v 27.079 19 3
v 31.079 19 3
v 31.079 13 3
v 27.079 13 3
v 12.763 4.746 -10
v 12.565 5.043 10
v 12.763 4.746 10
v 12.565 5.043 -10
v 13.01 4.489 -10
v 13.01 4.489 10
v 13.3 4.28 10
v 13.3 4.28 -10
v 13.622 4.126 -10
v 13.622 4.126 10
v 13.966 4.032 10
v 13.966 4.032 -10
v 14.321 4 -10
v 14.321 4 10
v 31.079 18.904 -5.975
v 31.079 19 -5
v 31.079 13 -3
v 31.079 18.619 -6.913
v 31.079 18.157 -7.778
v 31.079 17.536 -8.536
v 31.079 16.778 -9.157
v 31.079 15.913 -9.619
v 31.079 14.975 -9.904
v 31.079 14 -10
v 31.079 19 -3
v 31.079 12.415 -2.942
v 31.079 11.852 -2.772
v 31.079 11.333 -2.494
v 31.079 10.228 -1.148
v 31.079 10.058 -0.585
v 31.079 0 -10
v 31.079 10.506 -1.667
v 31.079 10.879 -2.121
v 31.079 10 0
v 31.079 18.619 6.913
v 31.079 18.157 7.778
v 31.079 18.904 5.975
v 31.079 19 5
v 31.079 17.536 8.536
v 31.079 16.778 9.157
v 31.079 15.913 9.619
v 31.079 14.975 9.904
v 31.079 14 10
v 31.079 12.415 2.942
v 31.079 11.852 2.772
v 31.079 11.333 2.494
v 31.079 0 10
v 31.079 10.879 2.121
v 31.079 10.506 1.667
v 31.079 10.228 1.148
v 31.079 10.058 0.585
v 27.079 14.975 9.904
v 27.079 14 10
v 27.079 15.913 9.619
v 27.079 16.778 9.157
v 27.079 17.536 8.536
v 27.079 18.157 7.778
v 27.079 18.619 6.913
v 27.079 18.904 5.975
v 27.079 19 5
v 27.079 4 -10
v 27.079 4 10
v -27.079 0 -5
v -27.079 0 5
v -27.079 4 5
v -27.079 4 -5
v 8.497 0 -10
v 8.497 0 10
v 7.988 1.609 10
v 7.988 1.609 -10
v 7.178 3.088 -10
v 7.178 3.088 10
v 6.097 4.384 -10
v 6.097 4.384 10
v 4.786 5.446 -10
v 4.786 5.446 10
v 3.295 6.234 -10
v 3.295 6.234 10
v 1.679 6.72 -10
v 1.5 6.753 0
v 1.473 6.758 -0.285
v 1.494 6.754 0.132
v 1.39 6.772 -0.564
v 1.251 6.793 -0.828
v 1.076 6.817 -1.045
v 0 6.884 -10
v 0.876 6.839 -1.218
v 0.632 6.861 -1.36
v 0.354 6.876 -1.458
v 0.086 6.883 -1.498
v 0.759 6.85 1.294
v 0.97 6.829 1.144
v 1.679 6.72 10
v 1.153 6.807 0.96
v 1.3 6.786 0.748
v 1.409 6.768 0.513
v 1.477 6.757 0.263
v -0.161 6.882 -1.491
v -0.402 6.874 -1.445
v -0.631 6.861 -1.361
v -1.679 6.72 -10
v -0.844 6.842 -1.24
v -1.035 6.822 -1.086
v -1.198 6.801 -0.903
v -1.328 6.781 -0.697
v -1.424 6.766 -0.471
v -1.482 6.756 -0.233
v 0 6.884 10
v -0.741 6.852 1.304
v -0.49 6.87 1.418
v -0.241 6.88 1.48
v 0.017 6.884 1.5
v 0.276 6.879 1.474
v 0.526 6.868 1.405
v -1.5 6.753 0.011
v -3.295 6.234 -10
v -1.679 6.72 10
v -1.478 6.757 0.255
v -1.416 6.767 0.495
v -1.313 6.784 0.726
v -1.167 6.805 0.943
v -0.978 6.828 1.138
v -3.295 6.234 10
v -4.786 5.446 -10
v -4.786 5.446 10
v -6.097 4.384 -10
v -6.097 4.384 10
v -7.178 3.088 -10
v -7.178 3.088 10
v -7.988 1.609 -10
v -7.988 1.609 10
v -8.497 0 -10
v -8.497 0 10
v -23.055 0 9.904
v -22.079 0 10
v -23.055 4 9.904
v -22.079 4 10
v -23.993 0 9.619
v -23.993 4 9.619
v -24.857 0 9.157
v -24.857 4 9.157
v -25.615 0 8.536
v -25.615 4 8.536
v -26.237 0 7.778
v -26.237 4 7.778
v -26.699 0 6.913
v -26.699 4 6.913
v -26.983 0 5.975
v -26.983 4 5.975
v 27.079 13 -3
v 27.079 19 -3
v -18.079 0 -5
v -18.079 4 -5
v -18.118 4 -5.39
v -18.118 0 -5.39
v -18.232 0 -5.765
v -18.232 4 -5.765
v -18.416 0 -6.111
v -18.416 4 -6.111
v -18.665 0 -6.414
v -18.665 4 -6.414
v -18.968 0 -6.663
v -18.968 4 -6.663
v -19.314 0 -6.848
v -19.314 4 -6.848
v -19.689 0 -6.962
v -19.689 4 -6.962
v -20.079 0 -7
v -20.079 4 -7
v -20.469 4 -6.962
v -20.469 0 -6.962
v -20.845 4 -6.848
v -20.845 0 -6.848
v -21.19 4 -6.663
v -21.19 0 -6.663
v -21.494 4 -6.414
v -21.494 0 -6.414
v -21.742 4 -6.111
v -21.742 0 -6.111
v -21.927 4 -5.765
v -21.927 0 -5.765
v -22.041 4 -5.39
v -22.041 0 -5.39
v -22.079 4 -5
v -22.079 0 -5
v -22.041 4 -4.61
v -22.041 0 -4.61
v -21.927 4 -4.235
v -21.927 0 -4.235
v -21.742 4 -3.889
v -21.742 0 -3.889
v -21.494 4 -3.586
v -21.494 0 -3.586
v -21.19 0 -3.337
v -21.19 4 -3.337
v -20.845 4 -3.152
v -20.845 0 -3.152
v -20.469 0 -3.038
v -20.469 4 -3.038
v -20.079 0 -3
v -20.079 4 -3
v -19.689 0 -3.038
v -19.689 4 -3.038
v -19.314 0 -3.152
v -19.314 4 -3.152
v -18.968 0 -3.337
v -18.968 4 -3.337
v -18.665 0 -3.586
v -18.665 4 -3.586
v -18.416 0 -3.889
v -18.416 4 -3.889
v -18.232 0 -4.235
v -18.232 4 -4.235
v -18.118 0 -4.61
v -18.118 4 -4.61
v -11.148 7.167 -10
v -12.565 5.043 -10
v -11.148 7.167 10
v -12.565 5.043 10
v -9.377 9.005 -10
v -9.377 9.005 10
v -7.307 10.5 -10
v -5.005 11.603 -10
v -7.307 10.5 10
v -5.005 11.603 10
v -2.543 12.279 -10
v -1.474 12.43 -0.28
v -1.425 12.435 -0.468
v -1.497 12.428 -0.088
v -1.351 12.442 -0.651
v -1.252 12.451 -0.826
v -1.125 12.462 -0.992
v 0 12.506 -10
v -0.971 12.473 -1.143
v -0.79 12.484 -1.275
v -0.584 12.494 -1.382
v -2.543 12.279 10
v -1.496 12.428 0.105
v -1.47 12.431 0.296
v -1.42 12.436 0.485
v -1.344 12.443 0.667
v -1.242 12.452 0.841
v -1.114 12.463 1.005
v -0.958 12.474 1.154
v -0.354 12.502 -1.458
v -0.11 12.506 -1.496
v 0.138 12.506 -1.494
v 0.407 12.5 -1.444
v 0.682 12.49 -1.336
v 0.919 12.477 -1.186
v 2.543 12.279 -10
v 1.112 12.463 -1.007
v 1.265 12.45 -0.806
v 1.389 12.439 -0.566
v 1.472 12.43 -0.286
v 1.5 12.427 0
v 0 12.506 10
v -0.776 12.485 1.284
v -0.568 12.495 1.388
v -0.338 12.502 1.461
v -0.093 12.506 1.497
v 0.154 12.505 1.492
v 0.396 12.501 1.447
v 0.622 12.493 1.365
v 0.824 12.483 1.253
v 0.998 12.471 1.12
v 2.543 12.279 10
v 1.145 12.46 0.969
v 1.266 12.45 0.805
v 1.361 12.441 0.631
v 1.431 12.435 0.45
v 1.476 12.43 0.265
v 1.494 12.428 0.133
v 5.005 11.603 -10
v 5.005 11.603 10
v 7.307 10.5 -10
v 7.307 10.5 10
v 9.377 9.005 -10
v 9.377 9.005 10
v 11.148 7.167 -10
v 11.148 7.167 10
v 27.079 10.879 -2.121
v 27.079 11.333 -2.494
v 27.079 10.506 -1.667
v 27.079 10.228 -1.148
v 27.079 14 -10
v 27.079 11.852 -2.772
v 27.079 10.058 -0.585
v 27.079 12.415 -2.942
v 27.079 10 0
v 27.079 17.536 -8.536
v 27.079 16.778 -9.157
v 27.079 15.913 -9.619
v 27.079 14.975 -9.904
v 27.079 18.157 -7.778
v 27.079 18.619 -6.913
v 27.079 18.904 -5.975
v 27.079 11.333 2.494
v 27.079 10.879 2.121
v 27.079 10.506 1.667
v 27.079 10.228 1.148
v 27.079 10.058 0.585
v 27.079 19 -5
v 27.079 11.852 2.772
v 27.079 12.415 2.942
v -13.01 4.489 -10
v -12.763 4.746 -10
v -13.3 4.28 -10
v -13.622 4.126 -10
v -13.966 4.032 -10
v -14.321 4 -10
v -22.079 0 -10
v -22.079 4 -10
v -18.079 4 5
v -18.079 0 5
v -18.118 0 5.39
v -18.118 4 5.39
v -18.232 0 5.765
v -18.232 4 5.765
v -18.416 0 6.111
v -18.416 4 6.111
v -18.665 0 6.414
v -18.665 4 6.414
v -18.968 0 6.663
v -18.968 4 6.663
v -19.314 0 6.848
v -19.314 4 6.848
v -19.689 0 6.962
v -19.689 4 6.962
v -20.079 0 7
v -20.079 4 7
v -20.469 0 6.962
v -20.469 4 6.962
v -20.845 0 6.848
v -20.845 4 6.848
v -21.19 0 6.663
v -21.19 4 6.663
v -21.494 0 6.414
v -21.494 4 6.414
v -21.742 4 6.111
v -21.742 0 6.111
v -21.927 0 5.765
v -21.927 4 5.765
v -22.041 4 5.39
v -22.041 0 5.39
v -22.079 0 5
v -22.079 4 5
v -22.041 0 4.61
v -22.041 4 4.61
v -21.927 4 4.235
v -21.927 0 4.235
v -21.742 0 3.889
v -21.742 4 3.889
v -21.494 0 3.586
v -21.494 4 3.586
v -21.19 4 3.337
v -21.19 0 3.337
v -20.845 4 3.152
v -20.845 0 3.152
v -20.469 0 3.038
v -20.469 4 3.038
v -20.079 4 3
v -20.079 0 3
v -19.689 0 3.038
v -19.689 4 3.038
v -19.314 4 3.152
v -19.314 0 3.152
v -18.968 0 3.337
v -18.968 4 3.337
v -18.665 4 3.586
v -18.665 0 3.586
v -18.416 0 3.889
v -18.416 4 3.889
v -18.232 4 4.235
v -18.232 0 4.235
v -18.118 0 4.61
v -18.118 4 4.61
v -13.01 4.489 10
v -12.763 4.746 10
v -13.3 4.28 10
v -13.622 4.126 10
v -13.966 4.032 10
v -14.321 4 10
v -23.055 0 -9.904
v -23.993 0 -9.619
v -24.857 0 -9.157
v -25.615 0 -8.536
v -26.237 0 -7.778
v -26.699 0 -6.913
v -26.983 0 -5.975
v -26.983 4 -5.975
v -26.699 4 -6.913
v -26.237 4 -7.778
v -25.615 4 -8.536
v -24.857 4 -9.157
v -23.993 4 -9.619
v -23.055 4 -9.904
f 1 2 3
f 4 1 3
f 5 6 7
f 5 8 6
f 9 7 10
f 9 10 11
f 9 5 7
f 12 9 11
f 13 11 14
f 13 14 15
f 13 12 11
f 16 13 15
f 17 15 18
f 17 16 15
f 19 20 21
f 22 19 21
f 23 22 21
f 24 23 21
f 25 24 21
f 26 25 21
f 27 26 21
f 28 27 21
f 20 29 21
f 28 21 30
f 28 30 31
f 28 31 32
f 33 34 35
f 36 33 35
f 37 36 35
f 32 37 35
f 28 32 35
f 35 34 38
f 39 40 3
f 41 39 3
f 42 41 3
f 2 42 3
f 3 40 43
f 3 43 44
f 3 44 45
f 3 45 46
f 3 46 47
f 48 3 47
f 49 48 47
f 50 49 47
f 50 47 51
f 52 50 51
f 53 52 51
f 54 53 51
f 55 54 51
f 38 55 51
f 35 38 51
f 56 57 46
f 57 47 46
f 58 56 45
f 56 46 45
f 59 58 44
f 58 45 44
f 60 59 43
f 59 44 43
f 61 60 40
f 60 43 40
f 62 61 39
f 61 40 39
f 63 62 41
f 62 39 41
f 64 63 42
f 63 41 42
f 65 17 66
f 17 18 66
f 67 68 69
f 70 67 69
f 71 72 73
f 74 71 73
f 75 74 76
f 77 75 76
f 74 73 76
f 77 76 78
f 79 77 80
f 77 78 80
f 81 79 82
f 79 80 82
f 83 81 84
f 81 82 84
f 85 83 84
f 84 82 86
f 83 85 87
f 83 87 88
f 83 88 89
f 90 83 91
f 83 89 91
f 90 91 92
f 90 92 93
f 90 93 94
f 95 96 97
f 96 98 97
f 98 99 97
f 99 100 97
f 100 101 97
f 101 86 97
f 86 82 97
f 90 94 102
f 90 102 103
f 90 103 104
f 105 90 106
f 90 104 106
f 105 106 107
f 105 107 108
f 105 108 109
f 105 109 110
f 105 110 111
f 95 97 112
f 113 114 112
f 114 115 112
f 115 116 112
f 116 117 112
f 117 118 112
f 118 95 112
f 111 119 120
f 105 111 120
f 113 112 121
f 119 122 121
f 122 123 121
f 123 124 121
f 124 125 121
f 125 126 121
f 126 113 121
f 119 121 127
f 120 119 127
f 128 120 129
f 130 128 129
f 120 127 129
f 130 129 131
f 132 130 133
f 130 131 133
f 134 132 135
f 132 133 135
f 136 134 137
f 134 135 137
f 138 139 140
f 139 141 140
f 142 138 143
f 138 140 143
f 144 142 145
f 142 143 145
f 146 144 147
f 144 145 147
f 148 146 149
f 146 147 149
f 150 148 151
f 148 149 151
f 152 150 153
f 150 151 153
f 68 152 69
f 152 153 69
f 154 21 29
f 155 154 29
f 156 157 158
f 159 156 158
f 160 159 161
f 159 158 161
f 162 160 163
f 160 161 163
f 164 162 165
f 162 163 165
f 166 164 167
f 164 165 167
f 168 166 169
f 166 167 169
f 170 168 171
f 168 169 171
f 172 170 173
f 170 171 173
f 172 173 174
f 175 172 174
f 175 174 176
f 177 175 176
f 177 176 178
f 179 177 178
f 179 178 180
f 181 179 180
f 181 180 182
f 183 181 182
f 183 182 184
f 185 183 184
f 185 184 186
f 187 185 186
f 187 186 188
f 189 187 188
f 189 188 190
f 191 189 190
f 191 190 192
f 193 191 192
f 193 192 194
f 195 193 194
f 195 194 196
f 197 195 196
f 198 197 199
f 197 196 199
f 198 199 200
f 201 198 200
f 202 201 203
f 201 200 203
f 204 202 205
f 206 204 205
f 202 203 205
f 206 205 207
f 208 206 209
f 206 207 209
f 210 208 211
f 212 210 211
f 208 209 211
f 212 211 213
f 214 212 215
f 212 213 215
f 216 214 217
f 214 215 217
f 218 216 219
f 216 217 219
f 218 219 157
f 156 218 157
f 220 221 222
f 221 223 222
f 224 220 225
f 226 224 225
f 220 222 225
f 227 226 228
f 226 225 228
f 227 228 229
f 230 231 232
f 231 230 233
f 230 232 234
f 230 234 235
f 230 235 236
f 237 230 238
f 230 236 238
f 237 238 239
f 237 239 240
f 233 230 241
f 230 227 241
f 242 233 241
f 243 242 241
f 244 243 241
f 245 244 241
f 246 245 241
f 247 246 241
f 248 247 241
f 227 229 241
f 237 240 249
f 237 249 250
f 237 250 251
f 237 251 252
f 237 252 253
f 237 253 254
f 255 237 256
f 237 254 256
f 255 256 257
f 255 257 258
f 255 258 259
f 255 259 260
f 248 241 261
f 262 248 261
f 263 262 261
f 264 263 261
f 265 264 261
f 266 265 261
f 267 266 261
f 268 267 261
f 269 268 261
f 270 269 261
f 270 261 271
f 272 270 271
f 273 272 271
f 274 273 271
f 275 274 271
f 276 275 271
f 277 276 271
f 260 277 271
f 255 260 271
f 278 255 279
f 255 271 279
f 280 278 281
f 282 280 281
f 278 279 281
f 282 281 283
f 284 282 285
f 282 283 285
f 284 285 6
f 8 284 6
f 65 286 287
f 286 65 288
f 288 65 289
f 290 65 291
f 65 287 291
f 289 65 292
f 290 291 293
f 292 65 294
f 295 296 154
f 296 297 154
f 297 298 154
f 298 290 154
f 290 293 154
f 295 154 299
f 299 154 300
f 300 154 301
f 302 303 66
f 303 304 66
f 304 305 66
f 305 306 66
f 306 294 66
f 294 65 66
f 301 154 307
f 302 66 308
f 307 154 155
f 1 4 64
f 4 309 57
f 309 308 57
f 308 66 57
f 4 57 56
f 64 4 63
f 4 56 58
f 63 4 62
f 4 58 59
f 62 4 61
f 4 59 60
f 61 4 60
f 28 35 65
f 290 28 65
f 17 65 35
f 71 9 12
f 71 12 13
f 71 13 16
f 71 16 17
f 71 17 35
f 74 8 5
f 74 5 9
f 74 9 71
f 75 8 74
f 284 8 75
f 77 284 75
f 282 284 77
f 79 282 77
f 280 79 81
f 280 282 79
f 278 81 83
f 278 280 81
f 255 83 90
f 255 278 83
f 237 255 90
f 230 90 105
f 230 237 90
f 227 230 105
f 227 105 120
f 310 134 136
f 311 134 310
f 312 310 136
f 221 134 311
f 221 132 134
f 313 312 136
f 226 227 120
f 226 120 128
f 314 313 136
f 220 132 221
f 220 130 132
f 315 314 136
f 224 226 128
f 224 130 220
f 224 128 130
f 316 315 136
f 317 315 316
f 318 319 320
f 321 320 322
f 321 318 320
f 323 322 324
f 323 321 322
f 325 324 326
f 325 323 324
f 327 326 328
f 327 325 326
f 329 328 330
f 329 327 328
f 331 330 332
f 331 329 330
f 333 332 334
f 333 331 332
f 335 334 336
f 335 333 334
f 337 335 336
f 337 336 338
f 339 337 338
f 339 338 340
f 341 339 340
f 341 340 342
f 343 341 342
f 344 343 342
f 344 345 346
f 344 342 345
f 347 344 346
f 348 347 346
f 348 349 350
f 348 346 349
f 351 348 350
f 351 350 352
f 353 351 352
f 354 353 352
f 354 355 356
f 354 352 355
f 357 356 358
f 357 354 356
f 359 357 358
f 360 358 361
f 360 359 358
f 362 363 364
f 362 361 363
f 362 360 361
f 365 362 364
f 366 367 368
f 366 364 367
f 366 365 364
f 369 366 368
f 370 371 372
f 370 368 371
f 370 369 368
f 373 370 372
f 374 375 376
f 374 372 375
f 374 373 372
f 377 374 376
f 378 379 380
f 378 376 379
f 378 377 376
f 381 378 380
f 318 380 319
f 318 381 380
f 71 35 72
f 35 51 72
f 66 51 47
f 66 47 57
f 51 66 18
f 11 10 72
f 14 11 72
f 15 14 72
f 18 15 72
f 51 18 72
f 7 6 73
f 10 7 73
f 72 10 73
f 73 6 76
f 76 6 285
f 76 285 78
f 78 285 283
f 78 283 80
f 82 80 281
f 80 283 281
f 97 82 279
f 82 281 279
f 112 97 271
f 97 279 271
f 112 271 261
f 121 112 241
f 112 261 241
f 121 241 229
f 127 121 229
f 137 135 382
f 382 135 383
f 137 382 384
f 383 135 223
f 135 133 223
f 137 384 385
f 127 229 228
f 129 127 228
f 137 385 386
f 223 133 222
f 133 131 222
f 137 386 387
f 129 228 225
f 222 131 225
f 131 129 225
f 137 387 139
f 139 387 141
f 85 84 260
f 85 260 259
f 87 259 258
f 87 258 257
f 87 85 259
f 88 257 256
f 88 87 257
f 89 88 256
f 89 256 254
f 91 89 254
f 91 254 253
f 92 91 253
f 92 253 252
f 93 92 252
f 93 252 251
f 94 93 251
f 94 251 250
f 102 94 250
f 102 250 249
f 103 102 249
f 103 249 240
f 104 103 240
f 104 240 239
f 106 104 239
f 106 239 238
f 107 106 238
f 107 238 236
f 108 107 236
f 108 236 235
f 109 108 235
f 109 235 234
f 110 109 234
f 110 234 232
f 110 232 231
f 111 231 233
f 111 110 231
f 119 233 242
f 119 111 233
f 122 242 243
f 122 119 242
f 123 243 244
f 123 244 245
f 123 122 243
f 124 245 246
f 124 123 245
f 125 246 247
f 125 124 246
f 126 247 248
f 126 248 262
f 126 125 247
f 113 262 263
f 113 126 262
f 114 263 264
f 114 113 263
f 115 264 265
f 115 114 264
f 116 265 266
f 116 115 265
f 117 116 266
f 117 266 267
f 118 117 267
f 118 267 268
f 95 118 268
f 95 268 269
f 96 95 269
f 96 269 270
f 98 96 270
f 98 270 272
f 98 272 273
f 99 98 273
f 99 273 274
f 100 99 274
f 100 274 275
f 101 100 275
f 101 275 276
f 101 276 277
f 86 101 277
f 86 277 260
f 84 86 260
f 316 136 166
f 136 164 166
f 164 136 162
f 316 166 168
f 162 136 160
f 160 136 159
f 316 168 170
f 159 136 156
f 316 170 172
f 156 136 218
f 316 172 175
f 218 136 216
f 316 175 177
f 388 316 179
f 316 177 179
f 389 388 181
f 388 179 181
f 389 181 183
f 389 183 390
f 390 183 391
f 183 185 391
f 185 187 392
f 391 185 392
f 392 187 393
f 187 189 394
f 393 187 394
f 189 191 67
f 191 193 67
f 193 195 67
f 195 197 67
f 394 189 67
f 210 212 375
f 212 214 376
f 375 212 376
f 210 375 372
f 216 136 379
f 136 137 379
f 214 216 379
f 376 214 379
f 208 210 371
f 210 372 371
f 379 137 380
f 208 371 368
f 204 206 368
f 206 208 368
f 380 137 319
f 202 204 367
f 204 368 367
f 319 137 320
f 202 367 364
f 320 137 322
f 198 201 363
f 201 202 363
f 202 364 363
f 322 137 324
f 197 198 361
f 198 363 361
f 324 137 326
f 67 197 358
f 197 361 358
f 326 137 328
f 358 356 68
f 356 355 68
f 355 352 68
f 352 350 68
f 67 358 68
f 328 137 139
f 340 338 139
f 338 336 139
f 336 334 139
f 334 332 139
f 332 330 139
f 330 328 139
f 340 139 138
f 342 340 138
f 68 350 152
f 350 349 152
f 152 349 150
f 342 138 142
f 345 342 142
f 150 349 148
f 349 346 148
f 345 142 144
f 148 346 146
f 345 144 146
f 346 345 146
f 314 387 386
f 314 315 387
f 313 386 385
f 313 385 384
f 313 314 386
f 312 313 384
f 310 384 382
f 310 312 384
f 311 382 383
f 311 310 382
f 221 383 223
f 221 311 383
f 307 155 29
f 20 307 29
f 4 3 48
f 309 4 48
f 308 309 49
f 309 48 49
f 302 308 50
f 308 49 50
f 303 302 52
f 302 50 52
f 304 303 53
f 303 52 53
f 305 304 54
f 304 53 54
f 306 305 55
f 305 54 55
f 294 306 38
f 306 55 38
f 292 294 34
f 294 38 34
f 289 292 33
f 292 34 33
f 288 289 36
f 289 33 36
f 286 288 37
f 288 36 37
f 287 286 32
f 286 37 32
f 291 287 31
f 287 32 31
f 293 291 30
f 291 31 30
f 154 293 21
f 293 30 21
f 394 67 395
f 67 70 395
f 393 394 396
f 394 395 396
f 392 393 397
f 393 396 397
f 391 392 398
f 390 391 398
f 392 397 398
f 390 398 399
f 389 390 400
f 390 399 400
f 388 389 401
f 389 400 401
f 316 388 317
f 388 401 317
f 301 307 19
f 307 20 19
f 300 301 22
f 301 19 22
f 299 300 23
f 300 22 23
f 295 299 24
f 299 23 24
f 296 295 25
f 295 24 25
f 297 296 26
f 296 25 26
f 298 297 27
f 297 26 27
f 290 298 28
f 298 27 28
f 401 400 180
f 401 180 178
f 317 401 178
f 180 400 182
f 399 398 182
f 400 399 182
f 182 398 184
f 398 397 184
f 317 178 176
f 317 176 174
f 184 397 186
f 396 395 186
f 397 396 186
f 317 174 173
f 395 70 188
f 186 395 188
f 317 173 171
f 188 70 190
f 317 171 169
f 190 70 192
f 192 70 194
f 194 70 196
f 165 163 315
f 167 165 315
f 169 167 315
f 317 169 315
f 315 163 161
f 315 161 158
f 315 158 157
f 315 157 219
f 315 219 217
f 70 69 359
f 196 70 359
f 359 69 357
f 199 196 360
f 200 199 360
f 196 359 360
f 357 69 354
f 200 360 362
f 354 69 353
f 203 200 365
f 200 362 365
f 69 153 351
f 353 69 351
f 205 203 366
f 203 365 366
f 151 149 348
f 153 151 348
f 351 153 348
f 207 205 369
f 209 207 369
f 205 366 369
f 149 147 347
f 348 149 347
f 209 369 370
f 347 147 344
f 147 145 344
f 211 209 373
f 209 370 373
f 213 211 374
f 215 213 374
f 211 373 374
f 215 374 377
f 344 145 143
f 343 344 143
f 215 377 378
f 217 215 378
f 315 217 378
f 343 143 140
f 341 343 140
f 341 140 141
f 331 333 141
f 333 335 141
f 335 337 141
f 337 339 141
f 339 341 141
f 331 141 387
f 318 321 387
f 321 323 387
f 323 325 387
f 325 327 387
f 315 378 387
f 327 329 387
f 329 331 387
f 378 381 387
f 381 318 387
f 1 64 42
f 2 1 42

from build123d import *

# Parameters (mm, degrees)
ESTRUSIONE_ESTRUSIONE1_DEPTH = 10
RACCORDO1_R                  = 5
RACCORDO2_R                  = 5
RACCORDO3_R                  = 2
SCHIZZO3_R                   = 2
TAGLIO_ESTRUSIONE1_DEPTH     = 20
SCHIZZO5_R                   = 1.5
TAGLIO_ESTRUSIONE2_DEPTH     = 20
TAGLIO_ESTRUSIONE3_DEPTH     = 20


with BuildPart() as part:
    # Schizzo2 → Estrusione-Estrusione1 (new body, symmetric)
    with BuildSketch(Plane.XY):
        with BuildLine():
            Line((-27.079304388, 0), (-27.079304388, 4))
            Line((-27.079304388, 4), (-13.079304388, 4))
            ThreePointArc((-13.079304388, 4), (0, 12.506273841), (13.079304388, 4))
            Line((13.079304388, 4), (27.079304388, 4))
            Line((27.079304388, 4), (27.079304388, 19))
            Line((27.079304388, 19), (31.079304388, 19))
            Line((31.079304388, 19), (31.079304388, 0))
            Line((31.079304388, 0), (8.496839078, 0))
            ThreePointArc((8.496839078, 0), (0, 6.88360126), (-8.496839078, 0))
            Line((-8.496839078, 0), (-27.079304388, 0))
        make_face()
    extrude(amount=ESTRUSIONE_ESTRUSIONE1_DEPTH, both=True)

    # Raccordo1
    raccordo1_edges = [part.edges().sort_by_distance(p)[0] for p in [
        (29.079304388, 19, -10),
        (29.079304388, 19, 10),
    ]]
    fillet(raccordo1_edges, radius=RACCORDO1_R)

    # Raccordo2
    raccordo2_edges = [part.edges().sort_by_distance(p)[0] for p in [
        (-27.079304388, 2, -10),
        (-27.079304388, 2, 10),
    ]]
    fillet(raccordo2_edges, radius=RACCORDO2_R)

    # Raccordo3
    raccordo3_edges = [part.edges().sort_by_distance(p)[0] for p in [
        (-13.079304388, 4, 0),
        (13.079304388, 4, 0),
    ]]
    fillet(raccordo3_edges, radius=RACCORDO3_R)

    # Schizzo3 → Taglio-Estrusione1 (cut)
    with BuildSketch(Plane(origin=(0, 4, 0), x_dir=(1, 0, 0), z_dir=(0, 1, 0))):
        with Locations((-20.079304388, 5)):
            Circle(SCHIZZO3_R)
    taglio_estrusione1 = extrude(amount=-TAGLIO_ESTRUSIONE1_DEPTH, mode=Mode.SUBTRACT)

    # Specchia1: Taglio-Estrusione1 across plane
    add(taglio_estrusione1.mirror(Plane.XY), mode=Mode.SUBTRACT)

    # Schizzo5 → Taglio-Estrusione2 (cut)
    with BuildSketch(Plane(origin=(0, 0, 0), x_dir=(1, 0, 0), z_dir=(0, 1, 0))):
        Circle(SCHIZZO5_R)
    extrude(amount=TAGLIO_ESTRUSIONE2_DEPTH, mode=Mode.SUBTRACT)

    # Schizzo7 → Taglio-Estrusione3 (cut)
    with BuildSketch(Plane(origin=(31.079304388, 0, 0), x_dir=(0, 0, -1), z_dir=(1, 0, 0))):
        with BuildLine():
            Line((-3, 19), (-3, 13))
            ThreePointArc((-3, 13), (0, 10), (3, 13))
            Line((3, 13), (3, 19))
            Line((3, 19), (-3, 19))
        make_face()
    extrude(amount=-TAGLIO_ESTRUSIONE3_DEPTH, mode=Mode.SUBTRACT)


solid = part.part
